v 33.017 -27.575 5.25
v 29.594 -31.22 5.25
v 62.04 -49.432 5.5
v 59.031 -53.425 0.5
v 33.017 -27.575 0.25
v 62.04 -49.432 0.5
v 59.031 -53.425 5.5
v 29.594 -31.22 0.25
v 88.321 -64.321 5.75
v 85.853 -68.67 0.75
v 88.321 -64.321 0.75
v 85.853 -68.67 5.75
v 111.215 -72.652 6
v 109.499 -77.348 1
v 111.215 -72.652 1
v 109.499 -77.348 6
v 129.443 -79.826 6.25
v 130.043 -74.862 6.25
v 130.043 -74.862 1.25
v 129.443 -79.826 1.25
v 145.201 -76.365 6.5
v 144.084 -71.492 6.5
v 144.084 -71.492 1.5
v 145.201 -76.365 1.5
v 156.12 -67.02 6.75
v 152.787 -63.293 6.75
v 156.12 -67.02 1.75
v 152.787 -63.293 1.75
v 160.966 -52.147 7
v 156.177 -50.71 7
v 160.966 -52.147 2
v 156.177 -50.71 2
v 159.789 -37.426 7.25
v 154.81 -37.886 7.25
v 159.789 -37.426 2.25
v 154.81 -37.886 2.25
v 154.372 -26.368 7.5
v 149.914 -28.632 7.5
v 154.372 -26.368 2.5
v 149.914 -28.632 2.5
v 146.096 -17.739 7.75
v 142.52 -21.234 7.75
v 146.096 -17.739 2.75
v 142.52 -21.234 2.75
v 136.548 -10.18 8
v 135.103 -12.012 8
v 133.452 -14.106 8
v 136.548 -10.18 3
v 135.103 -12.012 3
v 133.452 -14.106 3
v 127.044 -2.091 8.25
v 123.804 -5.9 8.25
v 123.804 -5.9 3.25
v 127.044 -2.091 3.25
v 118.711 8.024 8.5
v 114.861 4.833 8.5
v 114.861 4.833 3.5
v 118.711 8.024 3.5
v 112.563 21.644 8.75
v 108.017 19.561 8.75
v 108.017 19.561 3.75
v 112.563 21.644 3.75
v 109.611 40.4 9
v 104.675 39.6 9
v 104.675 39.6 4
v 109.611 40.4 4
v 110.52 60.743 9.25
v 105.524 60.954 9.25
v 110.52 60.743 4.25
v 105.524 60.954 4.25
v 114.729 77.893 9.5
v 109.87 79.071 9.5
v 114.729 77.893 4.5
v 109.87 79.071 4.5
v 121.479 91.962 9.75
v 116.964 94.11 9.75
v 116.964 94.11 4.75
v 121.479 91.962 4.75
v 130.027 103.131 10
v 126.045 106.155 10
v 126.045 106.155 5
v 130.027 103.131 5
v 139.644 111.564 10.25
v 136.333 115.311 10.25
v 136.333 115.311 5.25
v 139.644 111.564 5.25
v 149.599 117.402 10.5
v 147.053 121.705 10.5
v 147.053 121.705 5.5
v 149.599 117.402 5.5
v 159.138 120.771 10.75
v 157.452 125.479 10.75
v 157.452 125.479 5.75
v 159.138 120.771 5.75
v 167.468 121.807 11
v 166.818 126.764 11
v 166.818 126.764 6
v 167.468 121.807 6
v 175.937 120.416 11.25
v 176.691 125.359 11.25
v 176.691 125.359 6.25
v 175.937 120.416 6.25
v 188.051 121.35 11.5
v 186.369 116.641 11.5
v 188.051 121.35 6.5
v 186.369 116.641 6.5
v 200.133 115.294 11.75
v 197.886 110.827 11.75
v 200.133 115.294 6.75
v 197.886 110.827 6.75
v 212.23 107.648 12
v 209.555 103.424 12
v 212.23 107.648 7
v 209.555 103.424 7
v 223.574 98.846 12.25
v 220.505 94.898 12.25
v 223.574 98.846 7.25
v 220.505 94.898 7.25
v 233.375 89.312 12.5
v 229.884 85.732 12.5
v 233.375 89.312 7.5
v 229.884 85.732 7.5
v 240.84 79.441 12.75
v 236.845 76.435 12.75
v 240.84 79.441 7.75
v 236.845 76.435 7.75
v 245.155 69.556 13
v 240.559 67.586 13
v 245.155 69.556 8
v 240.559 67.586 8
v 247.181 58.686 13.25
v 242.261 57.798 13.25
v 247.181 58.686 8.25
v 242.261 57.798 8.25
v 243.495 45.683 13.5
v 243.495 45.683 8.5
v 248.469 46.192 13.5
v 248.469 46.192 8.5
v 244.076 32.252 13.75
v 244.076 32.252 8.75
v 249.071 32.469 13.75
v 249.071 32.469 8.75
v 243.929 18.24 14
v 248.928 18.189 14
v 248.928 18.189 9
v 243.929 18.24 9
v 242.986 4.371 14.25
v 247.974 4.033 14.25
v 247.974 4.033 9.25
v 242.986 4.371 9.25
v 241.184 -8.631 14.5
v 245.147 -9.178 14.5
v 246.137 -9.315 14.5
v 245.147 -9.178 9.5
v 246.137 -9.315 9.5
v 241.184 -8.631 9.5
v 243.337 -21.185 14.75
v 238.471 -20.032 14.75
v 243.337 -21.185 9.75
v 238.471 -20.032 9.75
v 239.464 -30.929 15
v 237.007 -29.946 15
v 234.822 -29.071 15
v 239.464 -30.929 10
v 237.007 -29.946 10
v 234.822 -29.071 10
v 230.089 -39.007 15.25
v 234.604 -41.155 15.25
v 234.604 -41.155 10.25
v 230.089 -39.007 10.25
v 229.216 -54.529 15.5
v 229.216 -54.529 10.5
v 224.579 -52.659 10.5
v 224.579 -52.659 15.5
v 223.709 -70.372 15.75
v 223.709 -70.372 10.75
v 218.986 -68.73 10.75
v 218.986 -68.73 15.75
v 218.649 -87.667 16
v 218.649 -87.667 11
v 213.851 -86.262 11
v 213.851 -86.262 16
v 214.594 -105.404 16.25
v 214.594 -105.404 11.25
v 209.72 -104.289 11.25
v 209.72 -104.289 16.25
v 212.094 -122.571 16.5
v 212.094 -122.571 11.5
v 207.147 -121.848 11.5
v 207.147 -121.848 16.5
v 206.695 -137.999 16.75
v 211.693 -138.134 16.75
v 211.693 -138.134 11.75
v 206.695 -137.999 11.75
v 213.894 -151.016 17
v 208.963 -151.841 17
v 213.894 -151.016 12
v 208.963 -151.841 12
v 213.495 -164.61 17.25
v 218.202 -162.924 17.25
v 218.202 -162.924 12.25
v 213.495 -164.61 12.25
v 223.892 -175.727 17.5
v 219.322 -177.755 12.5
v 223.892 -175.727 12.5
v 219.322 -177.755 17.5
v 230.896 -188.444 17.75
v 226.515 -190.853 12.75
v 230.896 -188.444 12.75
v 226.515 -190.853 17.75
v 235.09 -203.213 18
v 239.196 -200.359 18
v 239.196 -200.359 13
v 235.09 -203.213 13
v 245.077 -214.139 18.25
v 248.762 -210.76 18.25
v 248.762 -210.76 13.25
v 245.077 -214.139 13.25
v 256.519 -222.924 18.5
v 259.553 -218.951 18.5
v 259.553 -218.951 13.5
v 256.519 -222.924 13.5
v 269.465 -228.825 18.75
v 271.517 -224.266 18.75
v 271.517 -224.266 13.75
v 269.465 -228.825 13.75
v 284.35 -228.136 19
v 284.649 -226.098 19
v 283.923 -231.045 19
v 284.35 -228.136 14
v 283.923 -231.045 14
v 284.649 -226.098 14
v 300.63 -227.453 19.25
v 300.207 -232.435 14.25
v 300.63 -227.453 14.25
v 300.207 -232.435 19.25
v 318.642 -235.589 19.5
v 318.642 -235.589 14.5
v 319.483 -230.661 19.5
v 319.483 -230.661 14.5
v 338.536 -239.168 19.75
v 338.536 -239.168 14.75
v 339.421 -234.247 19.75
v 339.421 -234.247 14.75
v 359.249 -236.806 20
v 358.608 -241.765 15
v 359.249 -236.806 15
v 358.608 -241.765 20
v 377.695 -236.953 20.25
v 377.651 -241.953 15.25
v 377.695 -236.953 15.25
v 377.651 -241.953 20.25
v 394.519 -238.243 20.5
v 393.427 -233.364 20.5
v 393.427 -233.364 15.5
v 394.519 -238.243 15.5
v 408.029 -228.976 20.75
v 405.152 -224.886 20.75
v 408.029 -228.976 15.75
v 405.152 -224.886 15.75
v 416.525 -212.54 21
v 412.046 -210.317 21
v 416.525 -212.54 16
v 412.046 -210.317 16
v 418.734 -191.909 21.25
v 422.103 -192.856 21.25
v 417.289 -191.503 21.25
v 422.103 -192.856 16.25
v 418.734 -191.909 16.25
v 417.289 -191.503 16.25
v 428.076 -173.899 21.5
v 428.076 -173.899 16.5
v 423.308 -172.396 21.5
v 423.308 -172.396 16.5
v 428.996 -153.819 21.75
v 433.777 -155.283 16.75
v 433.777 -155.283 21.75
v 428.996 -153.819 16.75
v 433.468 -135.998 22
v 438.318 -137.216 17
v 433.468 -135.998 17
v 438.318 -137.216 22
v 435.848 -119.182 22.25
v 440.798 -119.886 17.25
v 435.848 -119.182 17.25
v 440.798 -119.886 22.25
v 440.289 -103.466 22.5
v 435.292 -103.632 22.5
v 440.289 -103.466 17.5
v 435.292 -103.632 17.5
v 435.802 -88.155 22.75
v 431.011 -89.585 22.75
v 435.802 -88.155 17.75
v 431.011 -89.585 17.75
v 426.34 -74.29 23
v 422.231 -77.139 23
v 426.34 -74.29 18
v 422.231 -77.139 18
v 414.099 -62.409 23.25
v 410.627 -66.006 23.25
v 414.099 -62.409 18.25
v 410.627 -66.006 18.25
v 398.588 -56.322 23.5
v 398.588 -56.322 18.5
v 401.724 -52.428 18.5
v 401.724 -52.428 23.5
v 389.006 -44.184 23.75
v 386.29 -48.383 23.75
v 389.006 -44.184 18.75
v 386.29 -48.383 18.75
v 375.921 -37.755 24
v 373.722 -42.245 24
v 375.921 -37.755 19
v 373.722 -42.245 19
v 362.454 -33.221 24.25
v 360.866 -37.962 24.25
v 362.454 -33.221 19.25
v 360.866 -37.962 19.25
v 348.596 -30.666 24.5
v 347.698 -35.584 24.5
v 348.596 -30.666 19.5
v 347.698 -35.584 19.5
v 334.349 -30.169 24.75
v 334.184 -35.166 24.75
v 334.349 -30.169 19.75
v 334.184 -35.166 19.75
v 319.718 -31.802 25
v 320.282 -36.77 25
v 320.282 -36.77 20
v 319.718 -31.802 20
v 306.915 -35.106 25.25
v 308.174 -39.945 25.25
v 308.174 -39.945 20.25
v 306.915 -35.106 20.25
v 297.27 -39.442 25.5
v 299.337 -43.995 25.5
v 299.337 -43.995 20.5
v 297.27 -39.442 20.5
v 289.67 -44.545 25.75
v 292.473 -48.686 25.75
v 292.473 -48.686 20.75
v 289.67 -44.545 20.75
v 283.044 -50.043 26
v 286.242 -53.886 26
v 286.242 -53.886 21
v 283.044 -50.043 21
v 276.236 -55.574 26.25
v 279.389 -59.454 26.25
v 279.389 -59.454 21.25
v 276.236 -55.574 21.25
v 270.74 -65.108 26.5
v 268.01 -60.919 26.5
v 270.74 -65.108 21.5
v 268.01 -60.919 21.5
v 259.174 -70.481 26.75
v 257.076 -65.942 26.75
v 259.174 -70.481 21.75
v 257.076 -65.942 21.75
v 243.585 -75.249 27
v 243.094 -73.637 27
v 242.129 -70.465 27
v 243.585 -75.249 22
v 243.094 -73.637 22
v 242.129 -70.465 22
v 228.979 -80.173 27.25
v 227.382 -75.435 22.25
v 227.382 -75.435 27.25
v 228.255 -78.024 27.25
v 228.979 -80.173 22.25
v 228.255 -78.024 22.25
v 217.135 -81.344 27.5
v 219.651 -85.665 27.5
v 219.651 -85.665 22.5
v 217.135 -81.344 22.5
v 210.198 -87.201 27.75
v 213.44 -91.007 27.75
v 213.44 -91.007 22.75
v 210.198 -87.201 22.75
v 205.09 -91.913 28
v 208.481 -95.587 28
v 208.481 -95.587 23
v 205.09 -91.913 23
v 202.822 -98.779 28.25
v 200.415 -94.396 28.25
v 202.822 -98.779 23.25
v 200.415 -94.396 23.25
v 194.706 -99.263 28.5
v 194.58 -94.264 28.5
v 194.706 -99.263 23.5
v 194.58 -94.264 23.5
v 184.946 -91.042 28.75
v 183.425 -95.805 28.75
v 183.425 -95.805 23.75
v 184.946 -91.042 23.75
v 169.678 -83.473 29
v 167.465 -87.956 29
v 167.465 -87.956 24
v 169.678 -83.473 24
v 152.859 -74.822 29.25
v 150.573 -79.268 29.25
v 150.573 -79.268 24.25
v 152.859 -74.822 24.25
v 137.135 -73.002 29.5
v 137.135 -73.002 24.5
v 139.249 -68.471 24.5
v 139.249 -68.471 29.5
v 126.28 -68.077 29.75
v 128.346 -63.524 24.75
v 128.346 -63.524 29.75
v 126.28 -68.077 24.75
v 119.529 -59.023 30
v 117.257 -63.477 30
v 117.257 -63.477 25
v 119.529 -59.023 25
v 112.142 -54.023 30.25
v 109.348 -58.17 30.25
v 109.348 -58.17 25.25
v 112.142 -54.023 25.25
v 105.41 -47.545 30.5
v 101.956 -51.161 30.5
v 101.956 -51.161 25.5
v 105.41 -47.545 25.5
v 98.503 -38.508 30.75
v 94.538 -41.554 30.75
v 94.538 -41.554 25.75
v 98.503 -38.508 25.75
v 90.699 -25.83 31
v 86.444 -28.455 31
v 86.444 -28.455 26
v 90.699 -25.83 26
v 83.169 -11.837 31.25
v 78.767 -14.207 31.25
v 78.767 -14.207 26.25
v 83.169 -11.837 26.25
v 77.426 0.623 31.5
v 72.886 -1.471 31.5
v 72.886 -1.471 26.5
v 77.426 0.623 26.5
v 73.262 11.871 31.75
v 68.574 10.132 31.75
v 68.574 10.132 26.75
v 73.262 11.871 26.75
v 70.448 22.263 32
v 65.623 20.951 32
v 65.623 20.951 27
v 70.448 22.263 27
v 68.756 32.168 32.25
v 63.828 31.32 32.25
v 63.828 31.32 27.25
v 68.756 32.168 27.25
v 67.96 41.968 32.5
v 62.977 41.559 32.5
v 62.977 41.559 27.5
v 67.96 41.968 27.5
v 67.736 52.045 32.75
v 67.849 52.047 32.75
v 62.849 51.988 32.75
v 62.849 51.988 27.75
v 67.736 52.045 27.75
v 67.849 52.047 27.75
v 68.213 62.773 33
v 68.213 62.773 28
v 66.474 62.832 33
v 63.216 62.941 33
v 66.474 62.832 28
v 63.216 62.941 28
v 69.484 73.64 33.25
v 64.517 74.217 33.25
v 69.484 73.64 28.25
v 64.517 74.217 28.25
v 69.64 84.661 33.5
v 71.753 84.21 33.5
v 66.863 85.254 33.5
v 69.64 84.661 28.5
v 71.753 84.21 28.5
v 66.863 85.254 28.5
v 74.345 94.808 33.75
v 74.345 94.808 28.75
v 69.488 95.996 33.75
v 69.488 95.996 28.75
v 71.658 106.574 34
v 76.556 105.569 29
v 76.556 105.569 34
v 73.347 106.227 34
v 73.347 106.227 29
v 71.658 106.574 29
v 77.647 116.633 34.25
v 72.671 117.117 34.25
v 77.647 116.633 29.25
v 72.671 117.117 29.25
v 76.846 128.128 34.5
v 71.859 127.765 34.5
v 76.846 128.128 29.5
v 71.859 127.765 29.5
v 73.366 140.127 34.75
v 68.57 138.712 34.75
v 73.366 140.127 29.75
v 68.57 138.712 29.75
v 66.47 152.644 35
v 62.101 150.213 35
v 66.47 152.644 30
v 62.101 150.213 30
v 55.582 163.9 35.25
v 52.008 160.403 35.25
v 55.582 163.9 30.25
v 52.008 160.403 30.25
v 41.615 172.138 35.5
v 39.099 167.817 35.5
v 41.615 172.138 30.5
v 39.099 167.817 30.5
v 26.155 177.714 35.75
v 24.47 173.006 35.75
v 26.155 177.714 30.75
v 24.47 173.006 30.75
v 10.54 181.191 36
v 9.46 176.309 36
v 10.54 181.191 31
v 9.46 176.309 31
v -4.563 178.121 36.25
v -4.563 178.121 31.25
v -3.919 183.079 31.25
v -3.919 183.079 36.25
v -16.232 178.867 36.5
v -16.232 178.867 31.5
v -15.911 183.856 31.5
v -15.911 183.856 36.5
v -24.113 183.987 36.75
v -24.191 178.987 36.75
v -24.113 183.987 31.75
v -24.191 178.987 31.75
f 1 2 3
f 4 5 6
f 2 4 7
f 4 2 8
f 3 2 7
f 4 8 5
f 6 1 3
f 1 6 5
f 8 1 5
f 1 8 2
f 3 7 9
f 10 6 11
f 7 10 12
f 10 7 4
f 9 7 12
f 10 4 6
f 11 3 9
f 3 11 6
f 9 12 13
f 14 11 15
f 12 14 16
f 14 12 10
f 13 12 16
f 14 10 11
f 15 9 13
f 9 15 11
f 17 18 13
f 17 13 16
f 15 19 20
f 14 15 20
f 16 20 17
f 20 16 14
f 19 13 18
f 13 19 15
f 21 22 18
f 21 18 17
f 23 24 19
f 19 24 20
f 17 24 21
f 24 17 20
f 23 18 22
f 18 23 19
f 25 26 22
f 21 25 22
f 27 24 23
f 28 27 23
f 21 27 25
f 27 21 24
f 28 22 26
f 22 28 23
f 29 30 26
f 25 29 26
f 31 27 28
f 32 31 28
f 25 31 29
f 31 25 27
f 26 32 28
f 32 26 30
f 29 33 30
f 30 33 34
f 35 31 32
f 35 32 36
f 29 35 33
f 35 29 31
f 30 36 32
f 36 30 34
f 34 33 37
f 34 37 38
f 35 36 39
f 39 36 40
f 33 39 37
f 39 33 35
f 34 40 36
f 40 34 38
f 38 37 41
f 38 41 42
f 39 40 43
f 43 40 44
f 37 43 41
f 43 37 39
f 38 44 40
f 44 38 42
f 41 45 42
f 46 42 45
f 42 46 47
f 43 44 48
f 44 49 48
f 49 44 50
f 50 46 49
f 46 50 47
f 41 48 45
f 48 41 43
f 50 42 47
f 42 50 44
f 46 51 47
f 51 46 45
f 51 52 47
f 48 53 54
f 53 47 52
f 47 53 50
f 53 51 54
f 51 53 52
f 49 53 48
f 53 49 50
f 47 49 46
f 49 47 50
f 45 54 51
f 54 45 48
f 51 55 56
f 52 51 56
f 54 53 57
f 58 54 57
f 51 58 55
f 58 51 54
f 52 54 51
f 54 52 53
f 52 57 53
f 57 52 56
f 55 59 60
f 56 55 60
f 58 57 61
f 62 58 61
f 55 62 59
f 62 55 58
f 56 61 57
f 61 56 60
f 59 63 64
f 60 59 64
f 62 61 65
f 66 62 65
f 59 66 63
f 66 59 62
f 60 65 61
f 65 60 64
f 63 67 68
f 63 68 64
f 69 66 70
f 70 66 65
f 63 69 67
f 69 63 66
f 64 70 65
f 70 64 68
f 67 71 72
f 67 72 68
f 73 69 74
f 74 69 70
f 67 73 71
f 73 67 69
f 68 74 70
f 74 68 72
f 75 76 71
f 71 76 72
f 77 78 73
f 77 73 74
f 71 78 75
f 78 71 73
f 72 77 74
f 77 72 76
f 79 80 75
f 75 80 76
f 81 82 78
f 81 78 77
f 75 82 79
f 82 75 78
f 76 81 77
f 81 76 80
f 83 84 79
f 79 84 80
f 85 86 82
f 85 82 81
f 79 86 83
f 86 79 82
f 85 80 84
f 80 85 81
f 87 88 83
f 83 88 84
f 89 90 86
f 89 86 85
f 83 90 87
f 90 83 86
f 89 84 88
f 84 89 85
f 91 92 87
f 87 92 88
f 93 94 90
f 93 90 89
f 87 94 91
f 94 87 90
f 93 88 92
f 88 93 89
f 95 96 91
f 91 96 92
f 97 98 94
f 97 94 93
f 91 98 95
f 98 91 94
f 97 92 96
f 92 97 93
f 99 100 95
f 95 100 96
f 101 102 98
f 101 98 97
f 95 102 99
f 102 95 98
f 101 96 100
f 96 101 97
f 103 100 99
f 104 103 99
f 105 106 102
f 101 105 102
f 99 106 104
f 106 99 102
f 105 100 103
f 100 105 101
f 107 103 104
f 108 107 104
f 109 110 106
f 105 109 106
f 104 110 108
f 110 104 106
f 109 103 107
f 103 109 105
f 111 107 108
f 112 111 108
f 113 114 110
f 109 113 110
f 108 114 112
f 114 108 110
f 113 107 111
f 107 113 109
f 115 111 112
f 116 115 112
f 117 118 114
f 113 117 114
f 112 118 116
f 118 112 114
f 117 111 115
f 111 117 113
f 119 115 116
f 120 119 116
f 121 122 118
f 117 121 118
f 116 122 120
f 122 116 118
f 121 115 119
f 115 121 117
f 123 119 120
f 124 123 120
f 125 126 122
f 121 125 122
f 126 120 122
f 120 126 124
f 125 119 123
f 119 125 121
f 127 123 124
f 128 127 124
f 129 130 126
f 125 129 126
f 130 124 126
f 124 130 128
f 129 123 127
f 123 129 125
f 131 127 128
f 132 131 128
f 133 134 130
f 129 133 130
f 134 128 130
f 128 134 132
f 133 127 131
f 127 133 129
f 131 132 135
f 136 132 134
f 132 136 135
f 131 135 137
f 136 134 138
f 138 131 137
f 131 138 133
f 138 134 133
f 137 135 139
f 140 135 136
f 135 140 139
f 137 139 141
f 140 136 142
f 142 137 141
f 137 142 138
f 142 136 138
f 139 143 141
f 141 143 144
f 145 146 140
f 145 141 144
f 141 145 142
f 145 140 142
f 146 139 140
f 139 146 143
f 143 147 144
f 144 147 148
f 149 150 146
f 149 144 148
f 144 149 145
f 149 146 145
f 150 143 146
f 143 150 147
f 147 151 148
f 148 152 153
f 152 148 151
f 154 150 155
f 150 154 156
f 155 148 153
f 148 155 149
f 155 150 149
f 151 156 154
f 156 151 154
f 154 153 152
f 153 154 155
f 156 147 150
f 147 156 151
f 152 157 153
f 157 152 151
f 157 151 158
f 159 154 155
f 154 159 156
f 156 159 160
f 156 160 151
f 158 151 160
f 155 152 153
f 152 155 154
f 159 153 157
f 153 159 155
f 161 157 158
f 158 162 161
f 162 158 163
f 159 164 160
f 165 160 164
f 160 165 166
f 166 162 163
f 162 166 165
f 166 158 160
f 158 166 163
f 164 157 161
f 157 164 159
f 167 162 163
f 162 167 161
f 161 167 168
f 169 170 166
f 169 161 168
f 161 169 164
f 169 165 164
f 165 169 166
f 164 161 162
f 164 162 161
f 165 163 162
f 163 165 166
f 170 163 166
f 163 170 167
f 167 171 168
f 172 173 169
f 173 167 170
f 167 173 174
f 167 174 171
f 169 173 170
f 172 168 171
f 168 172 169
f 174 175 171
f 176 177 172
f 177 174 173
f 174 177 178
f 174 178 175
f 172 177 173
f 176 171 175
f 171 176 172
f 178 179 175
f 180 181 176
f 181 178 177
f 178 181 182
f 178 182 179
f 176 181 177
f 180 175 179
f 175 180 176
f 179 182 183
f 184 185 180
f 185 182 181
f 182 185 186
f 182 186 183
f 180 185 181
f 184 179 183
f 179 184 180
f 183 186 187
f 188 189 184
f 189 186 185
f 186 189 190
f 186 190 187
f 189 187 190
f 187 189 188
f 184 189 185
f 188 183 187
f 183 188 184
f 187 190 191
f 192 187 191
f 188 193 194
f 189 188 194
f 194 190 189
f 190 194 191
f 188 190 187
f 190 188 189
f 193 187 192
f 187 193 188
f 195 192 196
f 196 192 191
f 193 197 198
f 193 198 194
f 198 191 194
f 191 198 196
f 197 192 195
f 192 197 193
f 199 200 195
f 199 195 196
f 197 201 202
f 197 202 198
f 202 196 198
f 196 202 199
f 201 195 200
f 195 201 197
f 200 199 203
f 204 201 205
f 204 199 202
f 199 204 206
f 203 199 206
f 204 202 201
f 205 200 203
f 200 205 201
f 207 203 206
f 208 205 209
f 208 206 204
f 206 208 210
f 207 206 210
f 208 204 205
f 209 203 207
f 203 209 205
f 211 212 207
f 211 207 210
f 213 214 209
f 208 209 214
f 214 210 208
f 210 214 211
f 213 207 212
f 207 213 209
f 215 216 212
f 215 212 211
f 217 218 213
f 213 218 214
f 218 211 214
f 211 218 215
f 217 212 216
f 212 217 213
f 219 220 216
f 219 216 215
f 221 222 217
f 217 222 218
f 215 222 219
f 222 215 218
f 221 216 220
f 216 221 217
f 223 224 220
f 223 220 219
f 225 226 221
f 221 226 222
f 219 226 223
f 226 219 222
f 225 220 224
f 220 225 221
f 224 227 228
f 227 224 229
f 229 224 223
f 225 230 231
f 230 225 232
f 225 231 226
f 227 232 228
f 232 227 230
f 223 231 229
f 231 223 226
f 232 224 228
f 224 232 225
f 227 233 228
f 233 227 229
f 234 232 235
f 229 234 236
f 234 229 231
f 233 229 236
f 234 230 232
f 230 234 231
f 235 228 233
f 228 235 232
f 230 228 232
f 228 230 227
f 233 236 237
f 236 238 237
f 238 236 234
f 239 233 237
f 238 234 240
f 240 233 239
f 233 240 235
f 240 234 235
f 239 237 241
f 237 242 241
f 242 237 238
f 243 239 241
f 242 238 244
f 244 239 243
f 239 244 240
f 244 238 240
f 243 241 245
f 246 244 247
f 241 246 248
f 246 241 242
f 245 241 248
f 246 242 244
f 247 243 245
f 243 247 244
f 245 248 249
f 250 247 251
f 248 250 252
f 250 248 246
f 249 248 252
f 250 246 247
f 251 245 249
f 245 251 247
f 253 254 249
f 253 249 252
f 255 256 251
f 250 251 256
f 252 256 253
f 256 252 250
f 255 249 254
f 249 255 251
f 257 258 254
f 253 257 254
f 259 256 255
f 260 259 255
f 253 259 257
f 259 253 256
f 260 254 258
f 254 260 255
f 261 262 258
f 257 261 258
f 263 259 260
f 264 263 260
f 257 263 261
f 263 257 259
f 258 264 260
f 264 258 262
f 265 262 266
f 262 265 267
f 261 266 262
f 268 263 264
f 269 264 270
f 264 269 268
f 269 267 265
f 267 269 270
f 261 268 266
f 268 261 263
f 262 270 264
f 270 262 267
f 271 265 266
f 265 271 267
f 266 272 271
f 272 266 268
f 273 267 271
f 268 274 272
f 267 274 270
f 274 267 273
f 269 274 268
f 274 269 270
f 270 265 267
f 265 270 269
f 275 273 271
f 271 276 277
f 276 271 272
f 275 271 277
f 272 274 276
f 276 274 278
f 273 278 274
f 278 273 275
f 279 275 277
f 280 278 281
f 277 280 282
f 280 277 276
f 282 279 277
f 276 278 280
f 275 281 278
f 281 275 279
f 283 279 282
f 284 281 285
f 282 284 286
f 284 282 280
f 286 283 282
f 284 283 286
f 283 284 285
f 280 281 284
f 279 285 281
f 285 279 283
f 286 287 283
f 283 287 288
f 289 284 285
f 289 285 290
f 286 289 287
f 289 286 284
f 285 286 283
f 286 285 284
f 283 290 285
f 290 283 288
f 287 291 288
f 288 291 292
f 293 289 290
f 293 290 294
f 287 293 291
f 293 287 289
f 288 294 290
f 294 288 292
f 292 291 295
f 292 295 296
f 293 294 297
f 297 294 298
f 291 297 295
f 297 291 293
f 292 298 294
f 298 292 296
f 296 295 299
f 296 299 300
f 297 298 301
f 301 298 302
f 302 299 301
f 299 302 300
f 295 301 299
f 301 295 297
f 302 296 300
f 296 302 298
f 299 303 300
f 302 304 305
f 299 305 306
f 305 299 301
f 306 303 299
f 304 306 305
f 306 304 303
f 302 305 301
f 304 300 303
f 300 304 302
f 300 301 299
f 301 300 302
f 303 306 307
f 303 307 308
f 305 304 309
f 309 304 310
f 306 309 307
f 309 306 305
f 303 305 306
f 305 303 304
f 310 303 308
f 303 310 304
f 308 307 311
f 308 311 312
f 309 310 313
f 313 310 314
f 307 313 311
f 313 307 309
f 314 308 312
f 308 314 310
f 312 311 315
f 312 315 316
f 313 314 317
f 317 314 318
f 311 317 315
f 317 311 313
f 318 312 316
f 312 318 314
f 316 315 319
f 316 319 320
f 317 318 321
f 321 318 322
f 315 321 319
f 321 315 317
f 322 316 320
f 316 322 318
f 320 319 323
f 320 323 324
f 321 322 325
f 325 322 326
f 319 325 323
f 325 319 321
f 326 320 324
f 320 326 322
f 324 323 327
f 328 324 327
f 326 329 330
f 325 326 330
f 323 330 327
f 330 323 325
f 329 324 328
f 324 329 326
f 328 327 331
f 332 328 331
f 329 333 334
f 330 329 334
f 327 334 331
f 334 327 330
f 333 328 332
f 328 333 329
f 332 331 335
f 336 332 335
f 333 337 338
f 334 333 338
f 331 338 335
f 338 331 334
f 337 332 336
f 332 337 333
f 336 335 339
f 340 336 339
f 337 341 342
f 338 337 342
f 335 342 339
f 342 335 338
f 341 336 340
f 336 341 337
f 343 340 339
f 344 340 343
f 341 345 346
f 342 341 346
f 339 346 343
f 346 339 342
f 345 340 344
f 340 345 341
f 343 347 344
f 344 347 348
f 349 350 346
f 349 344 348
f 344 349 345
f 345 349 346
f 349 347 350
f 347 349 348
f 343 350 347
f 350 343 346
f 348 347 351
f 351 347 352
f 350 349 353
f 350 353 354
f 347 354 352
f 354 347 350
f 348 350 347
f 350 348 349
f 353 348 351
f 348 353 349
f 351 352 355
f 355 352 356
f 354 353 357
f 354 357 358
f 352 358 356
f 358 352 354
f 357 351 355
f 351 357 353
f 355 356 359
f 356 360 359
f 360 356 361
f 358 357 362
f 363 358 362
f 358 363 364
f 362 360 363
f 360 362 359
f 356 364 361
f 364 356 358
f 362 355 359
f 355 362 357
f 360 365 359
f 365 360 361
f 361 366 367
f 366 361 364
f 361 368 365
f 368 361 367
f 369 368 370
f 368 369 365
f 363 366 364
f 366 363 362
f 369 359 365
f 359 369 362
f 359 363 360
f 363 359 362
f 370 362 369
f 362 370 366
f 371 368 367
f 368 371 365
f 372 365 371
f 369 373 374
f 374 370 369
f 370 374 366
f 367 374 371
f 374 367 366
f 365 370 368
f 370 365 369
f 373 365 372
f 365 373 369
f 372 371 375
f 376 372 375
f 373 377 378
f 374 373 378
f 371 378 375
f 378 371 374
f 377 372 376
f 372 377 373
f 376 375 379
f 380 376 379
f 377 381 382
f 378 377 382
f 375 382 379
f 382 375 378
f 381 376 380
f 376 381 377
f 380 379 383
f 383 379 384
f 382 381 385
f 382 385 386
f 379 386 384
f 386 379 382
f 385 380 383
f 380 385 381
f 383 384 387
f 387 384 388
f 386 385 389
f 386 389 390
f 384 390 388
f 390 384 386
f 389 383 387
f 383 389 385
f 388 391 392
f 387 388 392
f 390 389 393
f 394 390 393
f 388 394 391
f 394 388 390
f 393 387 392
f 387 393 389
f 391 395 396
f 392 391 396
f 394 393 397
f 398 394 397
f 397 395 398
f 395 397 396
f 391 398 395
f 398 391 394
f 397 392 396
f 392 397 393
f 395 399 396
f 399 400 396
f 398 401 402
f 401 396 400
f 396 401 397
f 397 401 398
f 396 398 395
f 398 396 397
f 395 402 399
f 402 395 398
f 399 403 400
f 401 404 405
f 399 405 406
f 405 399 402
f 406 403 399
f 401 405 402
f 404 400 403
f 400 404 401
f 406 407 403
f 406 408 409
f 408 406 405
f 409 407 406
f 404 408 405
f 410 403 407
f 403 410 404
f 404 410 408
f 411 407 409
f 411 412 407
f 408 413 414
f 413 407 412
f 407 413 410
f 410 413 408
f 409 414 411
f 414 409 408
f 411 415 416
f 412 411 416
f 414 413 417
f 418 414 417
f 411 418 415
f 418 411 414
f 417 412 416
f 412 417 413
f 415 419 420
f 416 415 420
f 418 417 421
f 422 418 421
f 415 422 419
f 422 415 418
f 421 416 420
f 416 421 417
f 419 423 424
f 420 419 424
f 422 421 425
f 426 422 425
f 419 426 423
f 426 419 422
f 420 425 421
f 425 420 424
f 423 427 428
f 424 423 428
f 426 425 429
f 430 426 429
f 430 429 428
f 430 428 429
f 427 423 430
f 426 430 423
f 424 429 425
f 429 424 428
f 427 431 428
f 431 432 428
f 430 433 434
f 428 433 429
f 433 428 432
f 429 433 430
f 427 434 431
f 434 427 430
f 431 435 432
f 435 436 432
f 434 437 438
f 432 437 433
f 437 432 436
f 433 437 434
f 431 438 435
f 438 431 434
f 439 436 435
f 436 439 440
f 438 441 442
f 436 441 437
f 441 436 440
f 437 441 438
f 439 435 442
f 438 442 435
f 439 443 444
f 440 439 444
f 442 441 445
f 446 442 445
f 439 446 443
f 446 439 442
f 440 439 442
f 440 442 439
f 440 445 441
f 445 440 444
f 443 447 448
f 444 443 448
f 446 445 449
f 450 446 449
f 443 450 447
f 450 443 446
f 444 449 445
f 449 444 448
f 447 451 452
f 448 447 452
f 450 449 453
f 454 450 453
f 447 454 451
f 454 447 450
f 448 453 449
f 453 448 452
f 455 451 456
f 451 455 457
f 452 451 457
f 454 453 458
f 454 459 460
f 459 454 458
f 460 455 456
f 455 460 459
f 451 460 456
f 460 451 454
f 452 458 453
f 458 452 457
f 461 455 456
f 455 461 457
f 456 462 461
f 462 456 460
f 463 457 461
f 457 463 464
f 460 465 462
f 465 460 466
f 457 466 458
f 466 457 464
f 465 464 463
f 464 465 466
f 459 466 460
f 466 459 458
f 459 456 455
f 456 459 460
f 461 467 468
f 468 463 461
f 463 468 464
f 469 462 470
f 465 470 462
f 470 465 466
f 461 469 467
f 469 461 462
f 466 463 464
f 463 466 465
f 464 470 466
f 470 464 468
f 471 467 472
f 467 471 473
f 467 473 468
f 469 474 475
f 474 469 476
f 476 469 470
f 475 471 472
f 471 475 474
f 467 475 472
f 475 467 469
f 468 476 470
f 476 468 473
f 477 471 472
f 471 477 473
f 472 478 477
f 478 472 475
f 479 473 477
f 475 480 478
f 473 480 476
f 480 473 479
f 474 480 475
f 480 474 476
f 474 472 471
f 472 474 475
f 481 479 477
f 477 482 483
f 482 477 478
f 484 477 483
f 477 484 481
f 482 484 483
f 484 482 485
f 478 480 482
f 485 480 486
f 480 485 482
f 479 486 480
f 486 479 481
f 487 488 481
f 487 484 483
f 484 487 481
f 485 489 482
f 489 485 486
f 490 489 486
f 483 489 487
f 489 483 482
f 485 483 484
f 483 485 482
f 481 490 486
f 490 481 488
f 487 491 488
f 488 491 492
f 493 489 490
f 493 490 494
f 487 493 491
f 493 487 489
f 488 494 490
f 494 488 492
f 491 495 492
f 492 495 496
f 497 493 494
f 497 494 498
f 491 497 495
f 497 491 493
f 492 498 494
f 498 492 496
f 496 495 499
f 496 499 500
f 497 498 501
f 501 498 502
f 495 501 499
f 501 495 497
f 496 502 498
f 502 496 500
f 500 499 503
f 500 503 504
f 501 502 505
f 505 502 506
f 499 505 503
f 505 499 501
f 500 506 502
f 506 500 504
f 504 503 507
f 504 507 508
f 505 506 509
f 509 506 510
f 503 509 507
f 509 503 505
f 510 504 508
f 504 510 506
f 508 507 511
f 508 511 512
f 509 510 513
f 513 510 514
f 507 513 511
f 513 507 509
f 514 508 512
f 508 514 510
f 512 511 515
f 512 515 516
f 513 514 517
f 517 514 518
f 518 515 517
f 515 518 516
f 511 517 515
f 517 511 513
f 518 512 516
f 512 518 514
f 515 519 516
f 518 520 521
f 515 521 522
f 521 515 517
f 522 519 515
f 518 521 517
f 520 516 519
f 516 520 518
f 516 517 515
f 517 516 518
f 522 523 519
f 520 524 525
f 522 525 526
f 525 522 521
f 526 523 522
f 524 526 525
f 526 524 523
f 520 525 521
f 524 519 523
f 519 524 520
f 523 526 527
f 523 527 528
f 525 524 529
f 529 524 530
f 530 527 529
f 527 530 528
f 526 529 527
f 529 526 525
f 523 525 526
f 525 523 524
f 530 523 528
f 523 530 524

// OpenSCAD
module marker(p = [0, 0, 0], a = 0, tail = true) {
	translate(p)
	rotate(a = a, v = [0, 0, 1])
	translate(v = [-0.5, -5, -0.5])
	cube(size = [1, 10, 1]);

	if(tail) {
		translate(p)
		rotate(a = a, v = [0, 0, 1])
		translate(v = [-20, -0.5, -0.5])
		cube(size = [20, 1, 1]);
	}
}

module marker_for_points(points, height = 5, width = 5) {
	poly = [
		[0, width / 2],
		[0, -width / 2]
	];

	assign(
		angle = atan((points[2][1] - points[1][1]) / (points[2][0] - points[1][0])),
		angle_modifier = points[2][0] >= points[1][0] ? 0 : 180,
		previous_angle = atan((points[1][1] - points[0][1]) / (points[1][0] - points[0][0])),
		previous_angle_modifier =	points[1][0] >= points[0][0] ? 0 : 180

	) {

		assign(
			angle = angle + angle_modifier,
			previous_angle = previous_angle + previous_angle_modifier
		) {

			assign(
				p1 = [
					poly[0][0] * cos(angle)
						- poly[0][1] * sin(angle)
						+ points[2][0],
					poly[0][0] * sin(angle)
						+ poly[0][1] * cos(angle)
						+ points[2][1],
					points[2][2]
				],
				p2 = [
					poly[1][0] * cos(angle)
						- poly[1][1] * sin(angle)
						+ points[2][0],
					poly[1][0] * sin(angle)
						+ poly[1][1] * cos(angle)
						+ points[2][1],
					points[2][2]
				],
				p3 = [
					poly[1][0] * cos(previous_angle)
						- poly[1][1] * sin(previous_angle)
						+ points[1][0],
					poly[1][0] * sin(previous_angle)
						+ poly[1][1] * cos(previous_angle)
						+ points[1][1],
					points[1][2]
				],
				p4 = [
					poly[0][0] * cos(previous_angle)
						- poly[0][1] * sin(previous_angle)
						+ points[1][0],
					poly[0][0] * sin(previous_angle)
						+ poly[0][1] * cos(previous_angle)
						+ points[1][1],
					points[1][2]
				]
			) {
				difference() {
					polyhedron(
						points = [
							p1 + [0, 0, height],
							p2 + [0, 0, height],
							p3 + [0, 0, height],
							p4 + [0, 0, height],
							p1,
							p2,
							p3,
							p4
						],
						faces = [
							[0, 1, 2, 3],
							[7, 6, 5, 4],
							[1, 0, 4, 5],
							[2, 1, 5, 6],
							[3, 2, 6, 7],
							[0, 3, 7, 4]
						]
					);





//					// why does this cylinder fix things?
//					translate(v = [99, 99, 99]) cylinder();
//
//					translate(v = [0, 0, height])
//					rotate(a = angle, v = [0, 0, 1])
//
//					translate(v = [-5, 0, 0])
//					rotate(a = 90, v = [0, 1, 0])
//					#cylinder(d = 5, h = 20);
//
//echo(angle);



				}
			}
		}
	}
}

points = [
[0.000000, 0.000000, 0.000000],
[31.305800, -29.397320, 0.250000],
[60.535720, -51.428570, 0.500000],
[87.087060, -66.495530, 0.750000],
[110.357150, -75.000000, 1.000000],
[129.743310, -77.343750, 1.250000],
[144.642860, -73.928580, 1.500000],
[154.453130, -65.156260, 1.750000],
[158.571430, -51.428580, 2.000000],
[157.299110, -37.656250, 2.250000],
[152.142860, -27.500000, 2.500000],
[144.308040, -19.486610, 2.750000],
[135.000000, -12.142860, 3.000000],
[125.424110, -3.995540, 3.250000],
[116.785720, 6.428570, 3.500000],
[110.290180, 20.602680, 3.750000],
[107.142860, 40.000000, 4.000000],
[108.021760, 60.848210, 4.250000],
[112.299110, 78.482140, 4.500000],
[119.221550, 93.035710, 4.750000],
[128.035720, 104.642850, 5.000000],
[137.988290, 113.437490, 5.250000],
[148.325900, 119.553570, 5.500000],
[158.295200, 123.125000, 5.750000],
[167.142860, 124.285710, 6.000000],
[176.314170, 122.887830, 6.250000],
[187.209820, 118.995530, 6.500000],
[199.009490, 113.060820, 6.750000],
[210.892860, 105.535710, 7.000000],
[222.039620, 96.872210, 7.250000],
[231.629470, 87.522320, 7.500000],
[238.842080, 77.938060, 7.750000],
[242.857150, 68.571430, 8.000000],
[244.720990, 58.242190, 8.250000],
[245.982150, 45.937500, 8.500000],
[246.573670, 32.360490, 8.750000],
[246.428580, 18.214280, 9.000000],
[245.479920, 4.202010, 9.250000],
[243.660720, -8.973220, 9.500000],
[240.904020, -20.608260, 9.750000],
[237.142860, -30.000000, 10.000000],
[232.346540, -40.080920, 10.250000],
[226.897320, -53.593750, 10.500000],
[221.347650, -69.550780, 10.750000],
[216.250000, -86.964290, 11.000000],
[212.156810, -104.846540, 11.250000],
[209.620540, -122.209830, 11.500000],
[209.193640, -138.066410, 11.750000],
[211.428580, -151.428580, 12.000000],
[215.848220, -163.766750, 12.250000],
[221.607150, -176.741080, 12.500000],
[228.705360, -189.648450, 12.750000],
[237.142860, -201.785720, 13.000000],
[246.919650, -212.449780, 13.250000],
[258.035720, -220.937500, 13.500000],
[270.491080, -226.545760, 13.750000],
[284.285720, -228.571430, 14.000000],
[300.418540, -229.944200, 14.250000],
[319.062510, -233.125000, 14.500000],
[338.978800, -236.707590, 14.750000],
[358.928580, -239.285720, 15.000000],
[377.673000, -239.453130, 15.250000],
[393.973220, -235.803580, 15.500000],
[406.590410, -226.930810, 15.750000],
[414.285720, -211.428580, 16.000000],
[419.695870, -192.179140, 16.250000],
[425.691970, -173.147330, 16.500000],
[431.386730, -154.550780, 16.750000],
[435.892860, -136.607150, 17.000000],
[438.323100, -119.534050, 17.250000],
[437.790180, -103.549110, 17.500000],
[433.406810, -88.869980, 17.750000],
[424.285720, -75.714290, 18.000000],
[412.363290, -64.207600, 18.250000],
[400.156260, -54.375010, 18.500000],
[387.647890, -46.283490, 18.750000],
[374.821430, -40.000010, 19.000000],
[361.660160, -35.591530, 19.250000],
[348.147330, -33.125000, 19.500000],
[334.266190, -32.667410, 19.750000],
[320.000010, -34.285720, 20.000000],
[307.544650, -37.525120, 20.250000],
[298.303580, -41.718760, 20.500000],
[291.071440, -46.615520, 20.750000],
[284.642870, -51.964290, 21.000000],
[277.812510, -57.513960, 21.250000],
[269.375010, -63.013400, 21.500000],
[258.125010, -68.211500, 21.750000],
[242.857150, -72.857150, 22.000000],
[228.180810, -77.804130, 22.250000],
[218.392860, -83.504470, 22.500000],
[211.819200, -89.104360, 22.750000],
[206.785720, -93.750010, 23.000000],
[201.618310, -96.587620, 23.250000],
[194.642860, -96.763400, 23.500000],
[184.185270, -93.423560, 23.750000],
[168.571430, -85.714290, 24.000000],
[151.715960, -77.045200, 24.250000],
[138.191970, -70.736610, 24.500000],
[127.313060, -65.800780, 24.750000],
[118.392860, -61.250000, 25.000000],
[110.744980, -56.096540, 25.250000],
[103.683040, -49.352680, 25.500000],
[96.520650, -40.030690, 25.750000],
[88.571430, -27.142860, 26.000000],
[80.968190, -13.021770, 26.250000],
[75.156250, -0.424110, 26.500000],
[70.917970, 11.001670, 26.750000],
[68.035720, 21.607140, 27.000000],
[66.291860, 31.743860, 27.250000],
[65.468750, 41.763390, 27.500000],
[65.348780, 52.017300, 27.750000],
[65.714290, 62.857140, 28.000000],
[67.000560, 73.928570, 28.250000],
[69.308040, 84.732140, 28.500000],
[71.916860, 95.401780, 28.750000],
[74.107150, 106.071430, 29.000000],
[75.159050, 116.875000, 29.250000],
[74.352680, 127.946430, 29.500000],
[70.968200, 139.419640, 29.750000],
[64.285720, 151.428570, 30.000000],
[53.794650, 162.151220, 30.250000],
[40.357150, 169.977680, 30.500000],
[25.312510, 175.359930, 30.750000],
[10.000010, 178.750000, 31.000000],
[-4.241060, 180.599890, 31.250000],
[-16.071420, 181.361610, 31.500000],
[-24.151780, 181.487190, 31.750000],
];

for (i = [2:len(points)-1]) {
	color(rands(0, 1, 3))
	marker_for_points(
		points = [
			points[i-2],
			points[i-1],
			points[i]
		]
	);
}
